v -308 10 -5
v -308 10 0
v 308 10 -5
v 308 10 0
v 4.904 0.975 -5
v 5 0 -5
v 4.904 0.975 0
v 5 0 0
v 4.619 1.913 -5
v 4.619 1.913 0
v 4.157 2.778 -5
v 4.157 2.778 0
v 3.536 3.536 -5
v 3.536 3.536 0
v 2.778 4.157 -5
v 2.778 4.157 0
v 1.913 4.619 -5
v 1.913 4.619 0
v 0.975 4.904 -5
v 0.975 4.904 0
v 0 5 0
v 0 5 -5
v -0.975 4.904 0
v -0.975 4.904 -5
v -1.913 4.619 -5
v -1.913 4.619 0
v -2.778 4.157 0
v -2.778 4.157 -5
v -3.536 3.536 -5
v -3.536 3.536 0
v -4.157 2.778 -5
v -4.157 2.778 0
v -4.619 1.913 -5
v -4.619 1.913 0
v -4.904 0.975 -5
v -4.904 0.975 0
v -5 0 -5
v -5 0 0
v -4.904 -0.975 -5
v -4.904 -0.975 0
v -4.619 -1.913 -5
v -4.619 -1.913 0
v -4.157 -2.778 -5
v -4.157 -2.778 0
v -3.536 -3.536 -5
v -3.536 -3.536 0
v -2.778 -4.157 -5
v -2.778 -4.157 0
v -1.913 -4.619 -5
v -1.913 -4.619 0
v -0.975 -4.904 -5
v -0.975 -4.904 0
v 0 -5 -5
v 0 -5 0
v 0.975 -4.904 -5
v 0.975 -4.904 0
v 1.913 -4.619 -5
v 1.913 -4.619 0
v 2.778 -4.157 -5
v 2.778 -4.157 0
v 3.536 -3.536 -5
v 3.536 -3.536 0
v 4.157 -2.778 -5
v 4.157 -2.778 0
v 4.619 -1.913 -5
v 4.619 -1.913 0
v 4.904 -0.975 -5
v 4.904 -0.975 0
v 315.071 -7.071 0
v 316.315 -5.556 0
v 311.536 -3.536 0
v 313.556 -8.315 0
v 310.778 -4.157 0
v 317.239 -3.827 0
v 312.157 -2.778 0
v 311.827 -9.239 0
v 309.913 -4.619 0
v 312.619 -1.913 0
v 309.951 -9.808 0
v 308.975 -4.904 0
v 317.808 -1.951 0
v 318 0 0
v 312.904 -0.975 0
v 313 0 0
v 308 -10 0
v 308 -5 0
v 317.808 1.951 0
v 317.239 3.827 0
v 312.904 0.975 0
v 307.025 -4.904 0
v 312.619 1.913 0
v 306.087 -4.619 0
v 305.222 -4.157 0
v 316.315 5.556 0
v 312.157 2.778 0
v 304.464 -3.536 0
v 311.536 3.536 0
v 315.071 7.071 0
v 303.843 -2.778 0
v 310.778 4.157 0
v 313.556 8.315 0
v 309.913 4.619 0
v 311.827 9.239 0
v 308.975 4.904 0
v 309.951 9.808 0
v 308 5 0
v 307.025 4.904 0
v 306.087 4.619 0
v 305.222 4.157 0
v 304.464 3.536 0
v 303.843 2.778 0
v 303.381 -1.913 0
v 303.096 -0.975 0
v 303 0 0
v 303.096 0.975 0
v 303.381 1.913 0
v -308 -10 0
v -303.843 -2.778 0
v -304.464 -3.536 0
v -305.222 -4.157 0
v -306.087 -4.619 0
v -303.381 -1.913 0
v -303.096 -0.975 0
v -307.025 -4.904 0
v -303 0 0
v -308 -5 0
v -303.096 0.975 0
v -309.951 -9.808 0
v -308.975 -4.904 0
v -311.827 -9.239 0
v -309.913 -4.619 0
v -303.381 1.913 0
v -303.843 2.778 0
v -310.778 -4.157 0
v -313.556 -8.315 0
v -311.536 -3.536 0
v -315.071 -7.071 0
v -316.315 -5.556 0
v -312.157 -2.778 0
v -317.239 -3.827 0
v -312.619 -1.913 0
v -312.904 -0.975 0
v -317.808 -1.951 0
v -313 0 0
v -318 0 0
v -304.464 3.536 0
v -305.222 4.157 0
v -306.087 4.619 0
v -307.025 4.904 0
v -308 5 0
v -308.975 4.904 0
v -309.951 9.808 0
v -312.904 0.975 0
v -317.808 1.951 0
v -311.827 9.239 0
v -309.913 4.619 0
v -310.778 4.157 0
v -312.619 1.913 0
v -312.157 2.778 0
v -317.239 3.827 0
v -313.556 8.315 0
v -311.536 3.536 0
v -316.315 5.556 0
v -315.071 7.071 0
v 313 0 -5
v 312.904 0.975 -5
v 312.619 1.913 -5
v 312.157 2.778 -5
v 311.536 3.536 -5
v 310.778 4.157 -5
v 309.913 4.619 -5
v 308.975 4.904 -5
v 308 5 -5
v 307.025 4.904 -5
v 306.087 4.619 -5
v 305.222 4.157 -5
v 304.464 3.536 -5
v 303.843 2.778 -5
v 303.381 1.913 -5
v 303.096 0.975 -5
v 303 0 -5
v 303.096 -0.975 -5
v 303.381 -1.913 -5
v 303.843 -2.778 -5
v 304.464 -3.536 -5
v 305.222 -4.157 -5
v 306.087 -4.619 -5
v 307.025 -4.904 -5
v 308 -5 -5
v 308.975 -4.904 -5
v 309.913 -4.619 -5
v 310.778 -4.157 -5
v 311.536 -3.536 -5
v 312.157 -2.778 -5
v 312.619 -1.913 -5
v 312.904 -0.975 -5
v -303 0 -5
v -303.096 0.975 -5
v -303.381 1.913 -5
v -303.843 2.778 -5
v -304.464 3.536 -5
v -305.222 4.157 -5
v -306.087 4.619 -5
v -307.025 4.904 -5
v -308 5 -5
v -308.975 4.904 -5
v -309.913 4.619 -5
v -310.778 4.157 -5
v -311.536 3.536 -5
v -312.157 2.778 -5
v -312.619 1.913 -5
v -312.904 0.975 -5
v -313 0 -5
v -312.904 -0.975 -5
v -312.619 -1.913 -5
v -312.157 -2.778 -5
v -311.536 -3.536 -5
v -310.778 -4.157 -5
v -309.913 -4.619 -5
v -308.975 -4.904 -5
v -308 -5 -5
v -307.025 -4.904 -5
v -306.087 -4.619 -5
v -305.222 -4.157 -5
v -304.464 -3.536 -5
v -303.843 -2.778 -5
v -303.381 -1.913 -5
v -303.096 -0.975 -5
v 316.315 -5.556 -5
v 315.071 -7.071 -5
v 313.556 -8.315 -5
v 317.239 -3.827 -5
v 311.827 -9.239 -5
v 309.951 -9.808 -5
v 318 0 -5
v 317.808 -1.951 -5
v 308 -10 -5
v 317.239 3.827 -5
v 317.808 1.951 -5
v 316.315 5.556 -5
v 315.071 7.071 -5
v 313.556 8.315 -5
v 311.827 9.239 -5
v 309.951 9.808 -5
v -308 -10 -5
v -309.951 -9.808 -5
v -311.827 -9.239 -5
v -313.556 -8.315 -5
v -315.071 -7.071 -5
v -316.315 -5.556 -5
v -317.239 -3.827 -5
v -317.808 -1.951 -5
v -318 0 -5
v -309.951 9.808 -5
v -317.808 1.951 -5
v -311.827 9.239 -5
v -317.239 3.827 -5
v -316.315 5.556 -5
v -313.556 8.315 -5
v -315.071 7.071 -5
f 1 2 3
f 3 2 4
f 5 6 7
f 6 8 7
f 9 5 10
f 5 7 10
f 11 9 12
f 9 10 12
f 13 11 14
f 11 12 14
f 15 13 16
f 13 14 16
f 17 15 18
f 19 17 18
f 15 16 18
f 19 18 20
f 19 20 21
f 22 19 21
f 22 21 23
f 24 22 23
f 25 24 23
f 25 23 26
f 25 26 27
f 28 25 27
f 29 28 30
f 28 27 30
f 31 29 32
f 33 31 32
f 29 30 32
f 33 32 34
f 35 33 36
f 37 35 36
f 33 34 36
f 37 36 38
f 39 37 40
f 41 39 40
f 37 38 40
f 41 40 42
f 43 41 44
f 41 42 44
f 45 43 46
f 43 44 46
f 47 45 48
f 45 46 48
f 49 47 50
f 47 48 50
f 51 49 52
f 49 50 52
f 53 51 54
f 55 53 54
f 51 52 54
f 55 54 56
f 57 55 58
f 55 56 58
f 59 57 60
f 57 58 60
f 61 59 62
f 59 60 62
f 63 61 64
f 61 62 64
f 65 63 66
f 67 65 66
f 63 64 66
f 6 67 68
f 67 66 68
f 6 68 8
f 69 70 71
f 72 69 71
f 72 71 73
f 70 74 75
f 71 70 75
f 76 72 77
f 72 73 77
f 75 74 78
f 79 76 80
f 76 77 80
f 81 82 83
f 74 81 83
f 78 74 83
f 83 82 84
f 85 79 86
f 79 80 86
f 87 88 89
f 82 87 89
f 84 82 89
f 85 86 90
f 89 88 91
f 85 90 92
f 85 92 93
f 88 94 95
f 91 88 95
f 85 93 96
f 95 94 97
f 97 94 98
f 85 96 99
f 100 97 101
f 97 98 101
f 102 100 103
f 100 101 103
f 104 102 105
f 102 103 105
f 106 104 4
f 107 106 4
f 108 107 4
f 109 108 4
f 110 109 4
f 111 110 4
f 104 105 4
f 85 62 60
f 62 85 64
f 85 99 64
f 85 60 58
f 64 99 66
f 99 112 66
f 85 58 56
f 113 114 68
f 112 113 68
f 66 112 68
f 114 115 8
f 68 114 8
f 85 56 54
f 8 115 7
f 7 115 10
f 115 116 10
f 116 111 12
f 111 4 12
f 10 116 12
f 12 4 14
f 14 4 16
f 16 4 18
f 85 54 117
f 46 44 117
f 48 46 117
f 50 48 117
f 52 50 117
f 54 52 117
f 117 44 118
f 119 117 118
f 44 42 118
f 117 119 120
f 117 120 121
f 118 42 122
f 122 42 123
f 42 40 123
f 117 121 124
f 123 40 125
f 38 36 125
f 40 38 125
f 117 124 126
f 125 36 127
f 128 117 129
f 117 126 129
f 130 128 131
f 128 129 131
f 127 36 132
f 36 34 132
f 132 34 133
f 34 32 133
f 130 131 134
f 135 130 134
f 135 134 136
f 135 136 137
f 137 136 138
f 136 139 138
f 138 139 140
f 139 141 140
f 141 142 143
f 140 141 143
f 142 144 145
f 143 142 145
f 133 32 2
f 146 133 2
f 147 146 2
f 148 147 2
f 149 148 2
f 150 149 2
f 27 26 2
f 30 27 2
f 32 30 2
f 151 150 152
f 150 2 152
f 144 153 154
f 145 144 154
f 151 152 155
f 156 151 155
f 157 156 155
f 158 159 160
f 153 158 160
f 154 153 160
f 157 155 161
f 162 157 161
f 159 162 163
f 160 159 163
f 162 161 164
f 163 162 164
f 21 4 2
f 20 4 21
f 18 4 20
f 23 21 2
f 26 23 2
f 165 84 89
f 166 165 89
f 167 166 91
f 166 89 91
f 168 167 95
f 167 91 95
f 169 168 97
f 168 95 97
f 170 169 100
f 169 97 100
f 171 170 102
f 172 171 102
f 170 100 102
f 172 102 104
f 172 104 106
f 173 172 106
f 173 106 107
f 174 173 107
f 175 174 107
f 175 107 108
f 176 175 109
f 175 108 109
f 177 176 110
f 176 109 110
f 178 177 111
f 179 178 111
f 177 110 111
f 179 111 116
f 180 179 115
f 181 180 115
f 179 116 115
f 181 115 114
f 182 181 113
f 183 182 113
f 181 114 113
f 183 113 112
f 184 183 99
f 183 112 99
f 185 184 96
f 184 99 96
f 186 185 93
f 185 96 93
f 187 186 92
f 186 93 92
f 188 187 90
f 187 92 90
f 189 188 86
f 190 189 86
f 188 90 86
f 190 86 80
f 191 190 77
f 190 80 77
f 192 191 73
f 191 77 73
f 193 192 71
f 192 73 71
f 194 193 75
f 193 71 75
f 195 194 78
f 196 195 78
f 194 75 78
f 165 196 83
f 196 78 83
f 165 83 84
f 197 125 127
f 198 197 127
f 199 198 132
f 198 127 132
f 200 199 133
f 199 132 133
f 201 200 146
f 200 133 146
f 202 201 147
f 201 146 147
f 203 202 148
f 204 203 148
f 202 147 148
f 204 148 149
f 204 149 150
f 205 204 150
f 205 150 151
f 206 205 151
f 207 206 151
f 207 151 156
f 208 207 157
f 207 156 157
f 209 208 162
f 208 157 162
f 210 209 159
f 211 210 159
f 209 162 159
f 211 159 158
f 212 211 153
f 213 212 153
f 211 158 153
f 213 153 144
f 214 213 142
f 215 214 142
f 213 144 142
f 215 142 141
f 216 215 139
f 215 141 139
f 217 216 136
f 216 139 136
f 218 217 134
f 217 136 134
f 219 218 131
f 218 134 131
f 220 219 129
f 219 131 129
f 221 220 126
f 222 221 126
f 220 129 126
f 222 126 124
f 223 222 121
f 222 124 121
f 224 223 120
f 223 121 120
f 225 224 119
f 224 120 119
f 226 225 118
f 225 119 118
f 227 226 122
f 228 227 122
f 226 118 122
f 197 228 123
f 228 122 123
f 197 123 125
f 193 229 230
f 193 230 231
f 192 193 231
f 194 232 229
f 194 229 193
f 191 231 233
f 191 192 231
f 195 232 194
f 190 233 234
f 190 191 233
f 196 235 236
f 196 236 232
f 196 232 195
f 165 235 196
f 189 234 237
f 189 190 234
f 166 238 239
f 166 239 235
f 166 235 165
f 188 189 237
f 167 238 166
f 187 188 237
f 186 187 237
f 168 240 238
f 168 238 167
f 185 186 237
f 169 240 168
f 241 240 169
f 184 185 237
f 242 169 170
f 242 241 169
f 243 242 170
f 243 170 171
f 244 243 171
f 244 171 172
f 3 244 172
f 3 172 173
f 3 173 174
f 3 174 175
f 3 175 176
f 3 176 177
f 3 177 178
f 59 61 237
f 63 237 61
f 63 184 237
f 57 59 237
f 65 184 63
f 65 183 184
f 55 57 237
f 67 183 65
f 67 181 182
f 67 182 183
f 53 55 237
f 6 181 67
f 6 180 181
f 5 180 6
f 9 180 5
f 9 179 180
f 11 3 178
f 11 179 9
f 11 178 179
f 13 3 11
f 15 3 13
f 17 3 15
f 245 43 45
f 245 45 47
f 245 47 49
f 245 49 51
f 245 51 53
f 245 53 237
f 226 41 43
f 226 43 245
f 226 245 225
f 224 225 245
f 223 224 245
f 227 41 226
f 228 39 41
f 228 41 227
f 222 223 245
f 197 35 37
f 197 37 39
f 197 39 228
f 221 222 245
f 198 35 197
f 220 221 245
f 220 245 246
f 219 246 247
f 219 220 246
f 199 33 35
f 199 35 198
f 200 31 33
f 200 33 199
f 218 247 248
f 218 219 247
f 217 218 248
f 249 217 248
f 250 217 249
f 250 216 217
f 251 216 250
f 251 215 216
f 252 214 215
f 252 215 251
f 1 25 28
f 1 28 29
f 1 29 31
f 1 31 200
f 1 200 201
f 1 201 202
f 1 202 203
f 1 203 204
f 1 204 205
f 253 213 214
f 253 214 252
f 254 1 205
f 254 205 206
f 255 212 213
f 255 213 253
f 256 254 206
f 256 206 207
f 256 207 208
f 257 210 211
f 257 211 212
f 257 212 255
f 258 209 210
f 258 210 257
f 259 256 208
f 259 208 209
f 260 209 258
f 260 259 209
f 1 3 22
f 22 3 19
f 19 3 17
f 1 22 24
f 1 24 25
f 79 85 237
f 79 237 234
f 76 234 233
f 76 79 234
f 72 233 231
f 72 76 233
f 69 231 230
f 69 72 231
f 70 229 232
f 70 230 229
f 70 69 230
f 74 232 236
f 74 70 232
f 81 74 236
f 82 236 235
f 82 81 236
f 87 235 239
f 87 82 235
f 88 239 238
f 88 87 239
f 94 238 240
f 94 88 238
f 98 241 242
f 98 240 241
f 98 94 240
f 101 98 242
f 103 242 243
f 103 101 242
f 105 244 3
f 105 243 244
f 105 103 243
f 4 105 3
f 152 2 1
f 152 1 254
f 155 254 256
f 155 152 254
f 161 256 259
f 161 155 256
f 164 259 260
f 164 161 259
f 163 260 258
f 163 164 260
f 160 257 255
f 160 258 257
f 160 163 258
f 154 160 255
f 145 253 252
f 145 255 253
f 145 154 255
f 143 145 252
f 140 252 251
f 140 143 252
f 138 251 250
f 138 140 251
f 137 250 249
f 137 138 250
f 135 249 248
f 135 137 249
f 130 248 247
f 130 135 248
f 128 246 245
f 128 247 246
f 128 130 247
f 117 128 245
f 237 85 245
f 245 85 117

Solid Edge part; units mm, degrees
sketch "Sketch1" plane through (0, 0, 0) normal (0, 0, 1) x (1, 0, 0)
  line L0 (-308, 10) -> (308, 10)
  line L1 (308, -10) -> (-308, -10)
  arc A0 (-308, -10) -> (-308, 10) centre (-308, 0) cw
  arc A1 (308, 10) -> (308, -10) centre (308, 0) cw
  circle A2 centre (-308, 0) radius 5
  circle A3 centre (308, 0) radius 5
  circle A4 centre (0, 0) radius 5
  dimension "D1" = 616
  dimension "D2" = 20
extrude "Protrusion1" add sketch "Sketch1" against normal blind 5
